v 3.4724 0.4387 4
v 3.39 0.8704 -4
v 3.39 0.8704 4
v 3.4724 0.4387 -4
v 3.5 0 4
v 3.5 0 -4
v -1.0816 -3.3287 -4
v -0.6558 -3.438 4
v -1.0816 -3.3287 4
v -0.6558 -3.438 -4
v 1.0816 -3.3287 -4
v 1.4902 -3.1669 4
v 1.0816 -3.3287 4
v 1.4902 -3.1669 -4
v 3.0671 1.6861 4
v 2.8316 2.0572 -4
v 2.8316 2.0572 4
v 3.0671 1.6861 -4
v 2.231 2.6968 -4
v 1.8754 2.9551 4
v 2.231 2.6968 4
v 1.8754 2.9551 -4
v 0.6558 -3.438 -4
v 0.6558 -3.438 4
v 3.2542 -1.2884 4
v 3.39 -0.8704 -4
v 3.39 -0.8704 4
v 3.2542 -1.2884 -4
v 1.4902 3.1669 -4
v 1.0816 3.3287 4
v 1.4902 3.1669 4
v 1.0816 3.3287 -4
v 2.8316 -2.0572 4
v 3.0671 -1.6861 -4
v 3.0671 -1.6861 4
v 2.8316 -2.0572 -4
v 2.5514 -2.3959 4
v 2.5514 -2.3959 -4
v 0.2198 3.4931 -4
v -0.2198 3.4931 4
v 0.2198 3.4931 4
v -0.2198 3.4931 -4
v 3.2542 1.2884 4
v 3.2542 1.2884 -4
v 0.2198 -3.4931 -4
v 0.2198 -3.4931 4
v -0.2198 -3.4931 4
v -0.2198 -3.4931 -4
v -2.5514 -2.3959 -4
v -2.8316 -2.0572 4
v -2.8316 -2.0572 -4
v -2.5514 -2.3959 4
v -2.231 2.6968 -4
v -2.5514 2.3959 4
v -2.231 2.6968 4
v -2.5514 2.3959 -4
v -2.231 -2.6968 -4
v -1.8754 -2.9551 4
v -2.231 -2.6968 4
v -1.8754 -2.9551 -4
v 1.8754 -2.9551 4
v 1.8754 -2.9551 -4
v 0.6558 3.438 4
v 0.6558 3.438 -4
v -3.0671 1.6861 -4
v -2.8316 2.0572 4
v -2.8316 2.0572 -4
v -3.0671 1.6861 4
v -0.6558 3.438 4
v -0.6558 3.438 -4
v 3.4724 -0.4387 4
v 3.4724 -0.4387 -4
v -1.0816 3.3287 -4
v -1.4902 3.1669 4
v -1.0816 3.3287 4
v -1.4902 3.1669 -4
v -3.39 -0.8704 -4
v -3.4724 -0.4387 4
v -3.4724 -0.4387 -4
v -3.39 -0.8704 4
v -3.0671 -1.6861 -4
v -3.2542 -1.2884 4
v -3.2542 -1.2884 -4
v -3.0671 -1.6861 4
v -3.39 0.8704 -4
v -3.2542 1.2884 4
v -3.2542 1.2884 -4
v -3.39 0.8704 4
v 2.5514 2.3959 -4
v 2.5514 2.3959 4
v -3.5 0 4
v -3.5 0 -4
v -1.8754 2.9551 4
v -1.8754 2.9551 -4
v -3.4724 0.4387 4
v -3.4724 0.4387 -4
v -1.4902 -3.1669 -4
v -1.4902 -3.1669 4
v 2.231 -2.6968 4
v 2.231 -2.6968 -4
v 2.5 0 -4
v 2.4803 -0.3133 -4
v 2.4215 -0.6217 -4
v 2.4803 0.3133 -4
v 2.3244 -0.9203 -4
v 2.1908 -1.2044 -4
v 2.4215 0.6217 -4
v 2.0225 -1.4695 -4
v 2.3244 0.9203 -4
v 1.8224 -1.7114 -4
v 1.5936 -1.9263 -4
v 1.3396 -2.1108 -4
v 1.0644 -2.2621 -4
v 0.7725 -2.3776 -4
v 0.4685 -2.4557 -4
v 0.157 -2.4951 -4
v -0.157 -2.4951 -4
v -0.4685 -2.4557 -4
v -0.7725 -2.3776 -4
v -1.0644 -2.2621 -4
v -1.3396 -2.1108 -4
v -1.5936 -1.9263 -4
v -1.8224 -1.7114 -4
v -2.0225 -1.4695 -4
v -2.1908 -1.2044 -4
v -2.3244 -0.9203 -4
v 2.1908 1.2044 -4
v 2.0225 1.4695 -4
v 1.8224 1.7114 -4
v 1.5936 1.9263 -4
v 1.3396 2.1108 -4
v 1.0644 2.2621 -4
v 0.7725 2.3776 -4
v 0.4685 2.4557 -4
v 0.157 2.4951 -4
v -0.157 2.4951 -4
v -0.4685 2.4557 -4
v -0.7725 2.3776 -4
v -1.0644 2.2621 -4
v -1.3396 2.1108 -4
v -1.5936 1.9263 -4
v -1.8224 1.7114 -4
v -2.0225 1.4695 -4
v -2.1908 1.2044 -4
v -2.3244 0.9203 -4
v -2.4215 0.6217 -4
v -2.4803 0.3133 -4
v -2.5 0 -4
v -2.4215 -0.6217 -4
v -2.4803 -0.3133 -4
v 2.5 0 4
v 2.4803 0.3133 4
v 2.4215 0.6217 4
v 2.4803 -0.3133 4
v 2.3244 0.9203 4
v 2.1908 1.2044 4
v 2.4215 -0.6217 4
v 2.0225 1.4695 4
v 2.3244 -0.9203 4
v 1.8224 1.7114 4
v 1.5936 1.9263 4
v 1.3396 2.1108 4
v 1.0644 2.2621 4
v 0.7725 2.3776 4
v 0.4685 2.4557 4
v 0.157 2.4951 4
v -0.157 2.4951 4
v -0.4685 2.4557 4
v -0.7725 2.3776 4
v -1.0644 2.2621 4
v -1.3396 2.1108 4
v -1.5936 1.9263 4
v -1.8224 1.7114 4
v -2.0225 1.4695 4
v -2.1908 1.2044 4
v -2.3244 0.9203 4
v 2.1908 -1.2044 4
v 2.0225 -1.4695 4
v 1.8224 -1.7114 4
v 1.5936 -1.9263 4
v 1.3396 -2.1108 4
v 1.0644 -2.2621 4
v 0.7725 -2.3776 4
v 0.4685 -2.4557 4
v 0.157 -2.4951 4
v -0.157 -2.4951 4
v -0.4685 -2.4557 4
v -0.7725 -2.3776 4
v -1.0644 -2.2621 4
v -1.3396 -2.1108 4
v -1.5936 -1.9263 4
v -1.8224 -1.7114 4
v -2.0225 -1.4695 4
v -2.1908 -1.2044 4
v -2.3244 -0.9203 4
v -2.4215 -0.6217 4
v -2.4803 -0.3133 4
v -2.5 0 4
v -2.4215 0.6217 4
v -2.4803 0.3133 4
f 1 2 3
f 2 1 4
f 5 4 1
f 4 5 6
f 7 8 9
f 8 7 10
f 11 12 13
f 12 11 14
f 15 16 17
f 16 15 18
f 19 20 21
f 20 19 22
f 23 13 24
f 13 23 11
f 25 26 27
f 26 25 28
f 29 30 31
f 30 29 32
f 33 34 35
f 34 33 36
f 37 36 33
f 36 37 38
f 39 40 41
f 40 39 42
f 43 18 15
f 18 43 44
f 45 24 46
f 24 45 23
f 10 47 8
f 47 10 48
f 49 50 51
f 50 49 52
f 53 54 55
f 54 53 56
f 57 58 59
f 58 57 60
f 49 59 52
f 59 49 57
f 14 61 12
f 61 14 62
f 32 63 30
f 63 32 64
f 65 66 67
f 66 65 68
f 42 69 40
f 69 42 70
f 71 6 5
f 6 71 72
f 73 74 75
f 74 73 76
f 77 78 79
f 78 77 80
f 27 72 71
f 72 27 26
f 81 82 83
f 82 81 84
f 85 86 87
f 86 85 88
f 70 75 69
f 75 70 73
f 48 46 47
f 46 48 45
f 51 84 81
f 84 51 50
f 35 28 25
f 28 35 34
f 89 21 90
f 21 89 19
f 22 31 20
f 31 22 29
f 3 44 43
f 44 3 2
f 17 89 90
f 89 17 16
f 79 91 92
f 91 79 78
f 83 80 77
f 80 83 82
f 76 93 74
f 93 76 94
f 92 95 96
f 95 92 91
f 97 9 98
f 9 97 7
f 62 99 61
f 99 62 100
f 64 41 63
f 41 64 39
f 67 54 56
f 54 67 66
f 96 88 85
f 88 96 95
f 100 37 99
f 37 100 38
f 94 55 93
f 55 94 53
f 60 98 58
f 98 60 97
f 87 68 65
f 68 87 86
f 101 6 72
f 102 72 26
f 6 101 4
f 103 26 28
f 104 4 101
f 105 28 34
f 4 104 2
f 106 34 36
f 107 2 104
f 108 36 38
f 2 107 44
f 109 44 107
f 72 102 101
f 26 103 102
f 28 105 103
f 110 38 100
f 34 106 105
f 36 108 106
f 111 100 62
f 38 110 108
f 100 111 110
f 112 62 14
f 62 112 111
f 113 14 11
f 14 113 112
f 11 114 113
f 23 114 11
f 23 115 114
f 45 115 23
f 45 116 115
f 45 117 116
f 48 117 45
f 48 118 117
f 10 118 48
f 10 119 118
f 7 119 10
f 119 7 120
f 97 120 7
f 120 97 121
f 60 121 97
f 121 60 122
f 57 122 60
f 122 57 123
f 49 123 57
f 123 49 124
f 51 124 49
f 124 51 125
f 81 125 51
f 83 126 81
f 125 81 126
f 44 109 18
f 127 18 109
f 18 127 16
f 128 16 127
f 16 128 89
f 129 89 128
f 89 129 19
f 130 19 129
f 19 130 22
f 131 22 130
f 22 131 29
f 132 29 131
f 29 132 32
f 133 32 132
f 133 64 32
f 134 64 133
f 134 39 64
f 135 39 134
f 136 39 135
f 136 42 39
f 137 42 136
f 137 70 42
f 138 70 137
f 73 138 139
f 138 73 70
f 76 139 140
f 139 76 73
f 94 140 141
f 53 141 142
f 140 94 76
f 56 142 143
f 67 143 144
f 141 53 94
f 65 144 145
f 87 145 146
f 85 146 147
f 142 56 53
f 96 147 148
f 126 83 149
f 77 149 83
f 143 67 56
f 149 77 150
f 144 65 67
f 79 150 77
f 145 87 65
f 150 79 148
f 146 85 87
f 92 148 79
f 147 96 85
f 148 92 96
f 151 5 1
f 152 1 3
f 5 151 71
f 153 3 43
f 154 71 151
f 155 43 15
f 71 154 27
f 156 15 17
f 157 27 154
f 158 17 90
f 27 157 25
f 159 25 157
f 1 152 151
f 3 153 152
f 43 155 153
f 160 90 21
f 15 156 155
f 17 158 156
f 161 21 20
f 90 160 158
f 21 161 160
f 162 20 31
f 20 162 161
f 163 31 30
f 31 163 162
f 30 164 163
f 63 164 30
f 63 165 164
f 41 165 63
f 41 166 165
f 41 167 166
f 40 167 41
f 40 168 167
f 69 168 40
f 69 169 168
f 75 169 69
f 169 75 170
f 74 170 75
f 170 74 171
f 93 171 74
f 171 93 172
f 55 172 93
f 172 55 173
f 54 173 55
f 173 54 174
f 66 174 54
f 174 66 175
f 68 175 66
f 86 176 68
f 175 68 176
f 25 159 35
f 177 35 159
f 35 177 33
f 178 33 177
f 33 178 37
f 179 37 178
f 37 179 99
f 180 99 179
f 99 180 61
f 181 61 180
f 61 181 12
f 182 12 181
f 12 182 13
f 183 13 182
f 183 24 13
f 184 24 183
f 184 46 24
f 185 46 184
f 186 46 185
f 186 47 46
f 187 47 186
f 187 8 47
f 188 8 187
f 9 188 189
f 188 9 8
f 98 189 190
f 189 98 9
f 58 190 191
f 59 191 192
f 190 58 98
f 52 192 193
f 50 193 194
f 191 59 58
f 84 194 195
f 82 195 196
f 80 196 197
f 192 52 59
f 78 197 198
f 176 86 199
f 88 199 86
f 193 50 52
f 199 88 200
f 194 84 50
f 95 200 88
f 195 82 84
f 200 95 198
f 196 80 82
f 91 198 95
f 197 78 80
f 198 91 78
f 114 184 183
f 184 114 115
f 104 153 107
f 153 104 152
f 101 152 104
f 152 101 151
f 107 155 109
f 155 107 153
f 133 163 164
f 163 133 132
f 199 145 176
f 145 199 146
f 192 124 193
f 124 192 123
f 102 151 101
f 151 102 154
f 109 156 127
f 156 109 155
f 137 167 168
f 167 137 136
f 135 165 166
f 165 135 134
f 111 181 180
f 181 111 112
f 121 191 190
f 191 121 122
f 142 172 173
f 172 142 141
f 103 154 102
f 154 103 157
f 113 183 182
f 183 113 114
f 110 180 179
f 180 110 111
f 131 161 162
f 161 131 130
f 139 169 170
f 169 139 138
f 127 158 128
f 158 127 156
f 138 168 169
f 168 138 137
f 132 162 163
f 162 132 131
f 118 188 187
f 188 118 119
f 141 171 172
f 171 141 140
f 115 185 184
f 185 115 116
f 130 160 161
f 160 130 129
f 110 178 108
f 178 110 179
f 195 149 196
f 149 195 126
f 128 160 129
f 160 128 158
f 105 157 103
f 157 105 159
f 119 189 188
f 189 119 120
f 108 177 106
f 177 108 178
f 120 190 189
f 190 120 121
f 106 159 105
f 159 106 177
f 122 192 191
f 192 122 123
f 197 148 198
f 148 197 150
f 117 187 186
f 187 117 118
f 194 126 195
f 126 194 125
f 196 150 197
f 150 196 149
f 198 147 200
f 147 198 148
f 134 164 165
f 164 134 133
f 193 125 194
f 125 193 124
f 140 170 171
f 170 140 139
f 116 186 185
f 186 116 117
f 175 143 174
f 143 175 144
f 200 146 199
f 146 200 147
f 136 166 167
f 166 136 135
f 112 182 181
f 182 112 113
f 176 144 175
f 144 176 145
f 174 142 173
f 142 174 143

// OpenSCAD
$fn = 50;


difference() {
	union() {
		translate(v = [0, 0, -4.0000000000]) {
			cylinder(h = 8, r = 3.5000000000);
		}
	}
	union() {
		translate(v = [0, 0, -100.0000000000]) {
			cylinder(h = 200, r = 2.5000000000);
		}
	}
}
